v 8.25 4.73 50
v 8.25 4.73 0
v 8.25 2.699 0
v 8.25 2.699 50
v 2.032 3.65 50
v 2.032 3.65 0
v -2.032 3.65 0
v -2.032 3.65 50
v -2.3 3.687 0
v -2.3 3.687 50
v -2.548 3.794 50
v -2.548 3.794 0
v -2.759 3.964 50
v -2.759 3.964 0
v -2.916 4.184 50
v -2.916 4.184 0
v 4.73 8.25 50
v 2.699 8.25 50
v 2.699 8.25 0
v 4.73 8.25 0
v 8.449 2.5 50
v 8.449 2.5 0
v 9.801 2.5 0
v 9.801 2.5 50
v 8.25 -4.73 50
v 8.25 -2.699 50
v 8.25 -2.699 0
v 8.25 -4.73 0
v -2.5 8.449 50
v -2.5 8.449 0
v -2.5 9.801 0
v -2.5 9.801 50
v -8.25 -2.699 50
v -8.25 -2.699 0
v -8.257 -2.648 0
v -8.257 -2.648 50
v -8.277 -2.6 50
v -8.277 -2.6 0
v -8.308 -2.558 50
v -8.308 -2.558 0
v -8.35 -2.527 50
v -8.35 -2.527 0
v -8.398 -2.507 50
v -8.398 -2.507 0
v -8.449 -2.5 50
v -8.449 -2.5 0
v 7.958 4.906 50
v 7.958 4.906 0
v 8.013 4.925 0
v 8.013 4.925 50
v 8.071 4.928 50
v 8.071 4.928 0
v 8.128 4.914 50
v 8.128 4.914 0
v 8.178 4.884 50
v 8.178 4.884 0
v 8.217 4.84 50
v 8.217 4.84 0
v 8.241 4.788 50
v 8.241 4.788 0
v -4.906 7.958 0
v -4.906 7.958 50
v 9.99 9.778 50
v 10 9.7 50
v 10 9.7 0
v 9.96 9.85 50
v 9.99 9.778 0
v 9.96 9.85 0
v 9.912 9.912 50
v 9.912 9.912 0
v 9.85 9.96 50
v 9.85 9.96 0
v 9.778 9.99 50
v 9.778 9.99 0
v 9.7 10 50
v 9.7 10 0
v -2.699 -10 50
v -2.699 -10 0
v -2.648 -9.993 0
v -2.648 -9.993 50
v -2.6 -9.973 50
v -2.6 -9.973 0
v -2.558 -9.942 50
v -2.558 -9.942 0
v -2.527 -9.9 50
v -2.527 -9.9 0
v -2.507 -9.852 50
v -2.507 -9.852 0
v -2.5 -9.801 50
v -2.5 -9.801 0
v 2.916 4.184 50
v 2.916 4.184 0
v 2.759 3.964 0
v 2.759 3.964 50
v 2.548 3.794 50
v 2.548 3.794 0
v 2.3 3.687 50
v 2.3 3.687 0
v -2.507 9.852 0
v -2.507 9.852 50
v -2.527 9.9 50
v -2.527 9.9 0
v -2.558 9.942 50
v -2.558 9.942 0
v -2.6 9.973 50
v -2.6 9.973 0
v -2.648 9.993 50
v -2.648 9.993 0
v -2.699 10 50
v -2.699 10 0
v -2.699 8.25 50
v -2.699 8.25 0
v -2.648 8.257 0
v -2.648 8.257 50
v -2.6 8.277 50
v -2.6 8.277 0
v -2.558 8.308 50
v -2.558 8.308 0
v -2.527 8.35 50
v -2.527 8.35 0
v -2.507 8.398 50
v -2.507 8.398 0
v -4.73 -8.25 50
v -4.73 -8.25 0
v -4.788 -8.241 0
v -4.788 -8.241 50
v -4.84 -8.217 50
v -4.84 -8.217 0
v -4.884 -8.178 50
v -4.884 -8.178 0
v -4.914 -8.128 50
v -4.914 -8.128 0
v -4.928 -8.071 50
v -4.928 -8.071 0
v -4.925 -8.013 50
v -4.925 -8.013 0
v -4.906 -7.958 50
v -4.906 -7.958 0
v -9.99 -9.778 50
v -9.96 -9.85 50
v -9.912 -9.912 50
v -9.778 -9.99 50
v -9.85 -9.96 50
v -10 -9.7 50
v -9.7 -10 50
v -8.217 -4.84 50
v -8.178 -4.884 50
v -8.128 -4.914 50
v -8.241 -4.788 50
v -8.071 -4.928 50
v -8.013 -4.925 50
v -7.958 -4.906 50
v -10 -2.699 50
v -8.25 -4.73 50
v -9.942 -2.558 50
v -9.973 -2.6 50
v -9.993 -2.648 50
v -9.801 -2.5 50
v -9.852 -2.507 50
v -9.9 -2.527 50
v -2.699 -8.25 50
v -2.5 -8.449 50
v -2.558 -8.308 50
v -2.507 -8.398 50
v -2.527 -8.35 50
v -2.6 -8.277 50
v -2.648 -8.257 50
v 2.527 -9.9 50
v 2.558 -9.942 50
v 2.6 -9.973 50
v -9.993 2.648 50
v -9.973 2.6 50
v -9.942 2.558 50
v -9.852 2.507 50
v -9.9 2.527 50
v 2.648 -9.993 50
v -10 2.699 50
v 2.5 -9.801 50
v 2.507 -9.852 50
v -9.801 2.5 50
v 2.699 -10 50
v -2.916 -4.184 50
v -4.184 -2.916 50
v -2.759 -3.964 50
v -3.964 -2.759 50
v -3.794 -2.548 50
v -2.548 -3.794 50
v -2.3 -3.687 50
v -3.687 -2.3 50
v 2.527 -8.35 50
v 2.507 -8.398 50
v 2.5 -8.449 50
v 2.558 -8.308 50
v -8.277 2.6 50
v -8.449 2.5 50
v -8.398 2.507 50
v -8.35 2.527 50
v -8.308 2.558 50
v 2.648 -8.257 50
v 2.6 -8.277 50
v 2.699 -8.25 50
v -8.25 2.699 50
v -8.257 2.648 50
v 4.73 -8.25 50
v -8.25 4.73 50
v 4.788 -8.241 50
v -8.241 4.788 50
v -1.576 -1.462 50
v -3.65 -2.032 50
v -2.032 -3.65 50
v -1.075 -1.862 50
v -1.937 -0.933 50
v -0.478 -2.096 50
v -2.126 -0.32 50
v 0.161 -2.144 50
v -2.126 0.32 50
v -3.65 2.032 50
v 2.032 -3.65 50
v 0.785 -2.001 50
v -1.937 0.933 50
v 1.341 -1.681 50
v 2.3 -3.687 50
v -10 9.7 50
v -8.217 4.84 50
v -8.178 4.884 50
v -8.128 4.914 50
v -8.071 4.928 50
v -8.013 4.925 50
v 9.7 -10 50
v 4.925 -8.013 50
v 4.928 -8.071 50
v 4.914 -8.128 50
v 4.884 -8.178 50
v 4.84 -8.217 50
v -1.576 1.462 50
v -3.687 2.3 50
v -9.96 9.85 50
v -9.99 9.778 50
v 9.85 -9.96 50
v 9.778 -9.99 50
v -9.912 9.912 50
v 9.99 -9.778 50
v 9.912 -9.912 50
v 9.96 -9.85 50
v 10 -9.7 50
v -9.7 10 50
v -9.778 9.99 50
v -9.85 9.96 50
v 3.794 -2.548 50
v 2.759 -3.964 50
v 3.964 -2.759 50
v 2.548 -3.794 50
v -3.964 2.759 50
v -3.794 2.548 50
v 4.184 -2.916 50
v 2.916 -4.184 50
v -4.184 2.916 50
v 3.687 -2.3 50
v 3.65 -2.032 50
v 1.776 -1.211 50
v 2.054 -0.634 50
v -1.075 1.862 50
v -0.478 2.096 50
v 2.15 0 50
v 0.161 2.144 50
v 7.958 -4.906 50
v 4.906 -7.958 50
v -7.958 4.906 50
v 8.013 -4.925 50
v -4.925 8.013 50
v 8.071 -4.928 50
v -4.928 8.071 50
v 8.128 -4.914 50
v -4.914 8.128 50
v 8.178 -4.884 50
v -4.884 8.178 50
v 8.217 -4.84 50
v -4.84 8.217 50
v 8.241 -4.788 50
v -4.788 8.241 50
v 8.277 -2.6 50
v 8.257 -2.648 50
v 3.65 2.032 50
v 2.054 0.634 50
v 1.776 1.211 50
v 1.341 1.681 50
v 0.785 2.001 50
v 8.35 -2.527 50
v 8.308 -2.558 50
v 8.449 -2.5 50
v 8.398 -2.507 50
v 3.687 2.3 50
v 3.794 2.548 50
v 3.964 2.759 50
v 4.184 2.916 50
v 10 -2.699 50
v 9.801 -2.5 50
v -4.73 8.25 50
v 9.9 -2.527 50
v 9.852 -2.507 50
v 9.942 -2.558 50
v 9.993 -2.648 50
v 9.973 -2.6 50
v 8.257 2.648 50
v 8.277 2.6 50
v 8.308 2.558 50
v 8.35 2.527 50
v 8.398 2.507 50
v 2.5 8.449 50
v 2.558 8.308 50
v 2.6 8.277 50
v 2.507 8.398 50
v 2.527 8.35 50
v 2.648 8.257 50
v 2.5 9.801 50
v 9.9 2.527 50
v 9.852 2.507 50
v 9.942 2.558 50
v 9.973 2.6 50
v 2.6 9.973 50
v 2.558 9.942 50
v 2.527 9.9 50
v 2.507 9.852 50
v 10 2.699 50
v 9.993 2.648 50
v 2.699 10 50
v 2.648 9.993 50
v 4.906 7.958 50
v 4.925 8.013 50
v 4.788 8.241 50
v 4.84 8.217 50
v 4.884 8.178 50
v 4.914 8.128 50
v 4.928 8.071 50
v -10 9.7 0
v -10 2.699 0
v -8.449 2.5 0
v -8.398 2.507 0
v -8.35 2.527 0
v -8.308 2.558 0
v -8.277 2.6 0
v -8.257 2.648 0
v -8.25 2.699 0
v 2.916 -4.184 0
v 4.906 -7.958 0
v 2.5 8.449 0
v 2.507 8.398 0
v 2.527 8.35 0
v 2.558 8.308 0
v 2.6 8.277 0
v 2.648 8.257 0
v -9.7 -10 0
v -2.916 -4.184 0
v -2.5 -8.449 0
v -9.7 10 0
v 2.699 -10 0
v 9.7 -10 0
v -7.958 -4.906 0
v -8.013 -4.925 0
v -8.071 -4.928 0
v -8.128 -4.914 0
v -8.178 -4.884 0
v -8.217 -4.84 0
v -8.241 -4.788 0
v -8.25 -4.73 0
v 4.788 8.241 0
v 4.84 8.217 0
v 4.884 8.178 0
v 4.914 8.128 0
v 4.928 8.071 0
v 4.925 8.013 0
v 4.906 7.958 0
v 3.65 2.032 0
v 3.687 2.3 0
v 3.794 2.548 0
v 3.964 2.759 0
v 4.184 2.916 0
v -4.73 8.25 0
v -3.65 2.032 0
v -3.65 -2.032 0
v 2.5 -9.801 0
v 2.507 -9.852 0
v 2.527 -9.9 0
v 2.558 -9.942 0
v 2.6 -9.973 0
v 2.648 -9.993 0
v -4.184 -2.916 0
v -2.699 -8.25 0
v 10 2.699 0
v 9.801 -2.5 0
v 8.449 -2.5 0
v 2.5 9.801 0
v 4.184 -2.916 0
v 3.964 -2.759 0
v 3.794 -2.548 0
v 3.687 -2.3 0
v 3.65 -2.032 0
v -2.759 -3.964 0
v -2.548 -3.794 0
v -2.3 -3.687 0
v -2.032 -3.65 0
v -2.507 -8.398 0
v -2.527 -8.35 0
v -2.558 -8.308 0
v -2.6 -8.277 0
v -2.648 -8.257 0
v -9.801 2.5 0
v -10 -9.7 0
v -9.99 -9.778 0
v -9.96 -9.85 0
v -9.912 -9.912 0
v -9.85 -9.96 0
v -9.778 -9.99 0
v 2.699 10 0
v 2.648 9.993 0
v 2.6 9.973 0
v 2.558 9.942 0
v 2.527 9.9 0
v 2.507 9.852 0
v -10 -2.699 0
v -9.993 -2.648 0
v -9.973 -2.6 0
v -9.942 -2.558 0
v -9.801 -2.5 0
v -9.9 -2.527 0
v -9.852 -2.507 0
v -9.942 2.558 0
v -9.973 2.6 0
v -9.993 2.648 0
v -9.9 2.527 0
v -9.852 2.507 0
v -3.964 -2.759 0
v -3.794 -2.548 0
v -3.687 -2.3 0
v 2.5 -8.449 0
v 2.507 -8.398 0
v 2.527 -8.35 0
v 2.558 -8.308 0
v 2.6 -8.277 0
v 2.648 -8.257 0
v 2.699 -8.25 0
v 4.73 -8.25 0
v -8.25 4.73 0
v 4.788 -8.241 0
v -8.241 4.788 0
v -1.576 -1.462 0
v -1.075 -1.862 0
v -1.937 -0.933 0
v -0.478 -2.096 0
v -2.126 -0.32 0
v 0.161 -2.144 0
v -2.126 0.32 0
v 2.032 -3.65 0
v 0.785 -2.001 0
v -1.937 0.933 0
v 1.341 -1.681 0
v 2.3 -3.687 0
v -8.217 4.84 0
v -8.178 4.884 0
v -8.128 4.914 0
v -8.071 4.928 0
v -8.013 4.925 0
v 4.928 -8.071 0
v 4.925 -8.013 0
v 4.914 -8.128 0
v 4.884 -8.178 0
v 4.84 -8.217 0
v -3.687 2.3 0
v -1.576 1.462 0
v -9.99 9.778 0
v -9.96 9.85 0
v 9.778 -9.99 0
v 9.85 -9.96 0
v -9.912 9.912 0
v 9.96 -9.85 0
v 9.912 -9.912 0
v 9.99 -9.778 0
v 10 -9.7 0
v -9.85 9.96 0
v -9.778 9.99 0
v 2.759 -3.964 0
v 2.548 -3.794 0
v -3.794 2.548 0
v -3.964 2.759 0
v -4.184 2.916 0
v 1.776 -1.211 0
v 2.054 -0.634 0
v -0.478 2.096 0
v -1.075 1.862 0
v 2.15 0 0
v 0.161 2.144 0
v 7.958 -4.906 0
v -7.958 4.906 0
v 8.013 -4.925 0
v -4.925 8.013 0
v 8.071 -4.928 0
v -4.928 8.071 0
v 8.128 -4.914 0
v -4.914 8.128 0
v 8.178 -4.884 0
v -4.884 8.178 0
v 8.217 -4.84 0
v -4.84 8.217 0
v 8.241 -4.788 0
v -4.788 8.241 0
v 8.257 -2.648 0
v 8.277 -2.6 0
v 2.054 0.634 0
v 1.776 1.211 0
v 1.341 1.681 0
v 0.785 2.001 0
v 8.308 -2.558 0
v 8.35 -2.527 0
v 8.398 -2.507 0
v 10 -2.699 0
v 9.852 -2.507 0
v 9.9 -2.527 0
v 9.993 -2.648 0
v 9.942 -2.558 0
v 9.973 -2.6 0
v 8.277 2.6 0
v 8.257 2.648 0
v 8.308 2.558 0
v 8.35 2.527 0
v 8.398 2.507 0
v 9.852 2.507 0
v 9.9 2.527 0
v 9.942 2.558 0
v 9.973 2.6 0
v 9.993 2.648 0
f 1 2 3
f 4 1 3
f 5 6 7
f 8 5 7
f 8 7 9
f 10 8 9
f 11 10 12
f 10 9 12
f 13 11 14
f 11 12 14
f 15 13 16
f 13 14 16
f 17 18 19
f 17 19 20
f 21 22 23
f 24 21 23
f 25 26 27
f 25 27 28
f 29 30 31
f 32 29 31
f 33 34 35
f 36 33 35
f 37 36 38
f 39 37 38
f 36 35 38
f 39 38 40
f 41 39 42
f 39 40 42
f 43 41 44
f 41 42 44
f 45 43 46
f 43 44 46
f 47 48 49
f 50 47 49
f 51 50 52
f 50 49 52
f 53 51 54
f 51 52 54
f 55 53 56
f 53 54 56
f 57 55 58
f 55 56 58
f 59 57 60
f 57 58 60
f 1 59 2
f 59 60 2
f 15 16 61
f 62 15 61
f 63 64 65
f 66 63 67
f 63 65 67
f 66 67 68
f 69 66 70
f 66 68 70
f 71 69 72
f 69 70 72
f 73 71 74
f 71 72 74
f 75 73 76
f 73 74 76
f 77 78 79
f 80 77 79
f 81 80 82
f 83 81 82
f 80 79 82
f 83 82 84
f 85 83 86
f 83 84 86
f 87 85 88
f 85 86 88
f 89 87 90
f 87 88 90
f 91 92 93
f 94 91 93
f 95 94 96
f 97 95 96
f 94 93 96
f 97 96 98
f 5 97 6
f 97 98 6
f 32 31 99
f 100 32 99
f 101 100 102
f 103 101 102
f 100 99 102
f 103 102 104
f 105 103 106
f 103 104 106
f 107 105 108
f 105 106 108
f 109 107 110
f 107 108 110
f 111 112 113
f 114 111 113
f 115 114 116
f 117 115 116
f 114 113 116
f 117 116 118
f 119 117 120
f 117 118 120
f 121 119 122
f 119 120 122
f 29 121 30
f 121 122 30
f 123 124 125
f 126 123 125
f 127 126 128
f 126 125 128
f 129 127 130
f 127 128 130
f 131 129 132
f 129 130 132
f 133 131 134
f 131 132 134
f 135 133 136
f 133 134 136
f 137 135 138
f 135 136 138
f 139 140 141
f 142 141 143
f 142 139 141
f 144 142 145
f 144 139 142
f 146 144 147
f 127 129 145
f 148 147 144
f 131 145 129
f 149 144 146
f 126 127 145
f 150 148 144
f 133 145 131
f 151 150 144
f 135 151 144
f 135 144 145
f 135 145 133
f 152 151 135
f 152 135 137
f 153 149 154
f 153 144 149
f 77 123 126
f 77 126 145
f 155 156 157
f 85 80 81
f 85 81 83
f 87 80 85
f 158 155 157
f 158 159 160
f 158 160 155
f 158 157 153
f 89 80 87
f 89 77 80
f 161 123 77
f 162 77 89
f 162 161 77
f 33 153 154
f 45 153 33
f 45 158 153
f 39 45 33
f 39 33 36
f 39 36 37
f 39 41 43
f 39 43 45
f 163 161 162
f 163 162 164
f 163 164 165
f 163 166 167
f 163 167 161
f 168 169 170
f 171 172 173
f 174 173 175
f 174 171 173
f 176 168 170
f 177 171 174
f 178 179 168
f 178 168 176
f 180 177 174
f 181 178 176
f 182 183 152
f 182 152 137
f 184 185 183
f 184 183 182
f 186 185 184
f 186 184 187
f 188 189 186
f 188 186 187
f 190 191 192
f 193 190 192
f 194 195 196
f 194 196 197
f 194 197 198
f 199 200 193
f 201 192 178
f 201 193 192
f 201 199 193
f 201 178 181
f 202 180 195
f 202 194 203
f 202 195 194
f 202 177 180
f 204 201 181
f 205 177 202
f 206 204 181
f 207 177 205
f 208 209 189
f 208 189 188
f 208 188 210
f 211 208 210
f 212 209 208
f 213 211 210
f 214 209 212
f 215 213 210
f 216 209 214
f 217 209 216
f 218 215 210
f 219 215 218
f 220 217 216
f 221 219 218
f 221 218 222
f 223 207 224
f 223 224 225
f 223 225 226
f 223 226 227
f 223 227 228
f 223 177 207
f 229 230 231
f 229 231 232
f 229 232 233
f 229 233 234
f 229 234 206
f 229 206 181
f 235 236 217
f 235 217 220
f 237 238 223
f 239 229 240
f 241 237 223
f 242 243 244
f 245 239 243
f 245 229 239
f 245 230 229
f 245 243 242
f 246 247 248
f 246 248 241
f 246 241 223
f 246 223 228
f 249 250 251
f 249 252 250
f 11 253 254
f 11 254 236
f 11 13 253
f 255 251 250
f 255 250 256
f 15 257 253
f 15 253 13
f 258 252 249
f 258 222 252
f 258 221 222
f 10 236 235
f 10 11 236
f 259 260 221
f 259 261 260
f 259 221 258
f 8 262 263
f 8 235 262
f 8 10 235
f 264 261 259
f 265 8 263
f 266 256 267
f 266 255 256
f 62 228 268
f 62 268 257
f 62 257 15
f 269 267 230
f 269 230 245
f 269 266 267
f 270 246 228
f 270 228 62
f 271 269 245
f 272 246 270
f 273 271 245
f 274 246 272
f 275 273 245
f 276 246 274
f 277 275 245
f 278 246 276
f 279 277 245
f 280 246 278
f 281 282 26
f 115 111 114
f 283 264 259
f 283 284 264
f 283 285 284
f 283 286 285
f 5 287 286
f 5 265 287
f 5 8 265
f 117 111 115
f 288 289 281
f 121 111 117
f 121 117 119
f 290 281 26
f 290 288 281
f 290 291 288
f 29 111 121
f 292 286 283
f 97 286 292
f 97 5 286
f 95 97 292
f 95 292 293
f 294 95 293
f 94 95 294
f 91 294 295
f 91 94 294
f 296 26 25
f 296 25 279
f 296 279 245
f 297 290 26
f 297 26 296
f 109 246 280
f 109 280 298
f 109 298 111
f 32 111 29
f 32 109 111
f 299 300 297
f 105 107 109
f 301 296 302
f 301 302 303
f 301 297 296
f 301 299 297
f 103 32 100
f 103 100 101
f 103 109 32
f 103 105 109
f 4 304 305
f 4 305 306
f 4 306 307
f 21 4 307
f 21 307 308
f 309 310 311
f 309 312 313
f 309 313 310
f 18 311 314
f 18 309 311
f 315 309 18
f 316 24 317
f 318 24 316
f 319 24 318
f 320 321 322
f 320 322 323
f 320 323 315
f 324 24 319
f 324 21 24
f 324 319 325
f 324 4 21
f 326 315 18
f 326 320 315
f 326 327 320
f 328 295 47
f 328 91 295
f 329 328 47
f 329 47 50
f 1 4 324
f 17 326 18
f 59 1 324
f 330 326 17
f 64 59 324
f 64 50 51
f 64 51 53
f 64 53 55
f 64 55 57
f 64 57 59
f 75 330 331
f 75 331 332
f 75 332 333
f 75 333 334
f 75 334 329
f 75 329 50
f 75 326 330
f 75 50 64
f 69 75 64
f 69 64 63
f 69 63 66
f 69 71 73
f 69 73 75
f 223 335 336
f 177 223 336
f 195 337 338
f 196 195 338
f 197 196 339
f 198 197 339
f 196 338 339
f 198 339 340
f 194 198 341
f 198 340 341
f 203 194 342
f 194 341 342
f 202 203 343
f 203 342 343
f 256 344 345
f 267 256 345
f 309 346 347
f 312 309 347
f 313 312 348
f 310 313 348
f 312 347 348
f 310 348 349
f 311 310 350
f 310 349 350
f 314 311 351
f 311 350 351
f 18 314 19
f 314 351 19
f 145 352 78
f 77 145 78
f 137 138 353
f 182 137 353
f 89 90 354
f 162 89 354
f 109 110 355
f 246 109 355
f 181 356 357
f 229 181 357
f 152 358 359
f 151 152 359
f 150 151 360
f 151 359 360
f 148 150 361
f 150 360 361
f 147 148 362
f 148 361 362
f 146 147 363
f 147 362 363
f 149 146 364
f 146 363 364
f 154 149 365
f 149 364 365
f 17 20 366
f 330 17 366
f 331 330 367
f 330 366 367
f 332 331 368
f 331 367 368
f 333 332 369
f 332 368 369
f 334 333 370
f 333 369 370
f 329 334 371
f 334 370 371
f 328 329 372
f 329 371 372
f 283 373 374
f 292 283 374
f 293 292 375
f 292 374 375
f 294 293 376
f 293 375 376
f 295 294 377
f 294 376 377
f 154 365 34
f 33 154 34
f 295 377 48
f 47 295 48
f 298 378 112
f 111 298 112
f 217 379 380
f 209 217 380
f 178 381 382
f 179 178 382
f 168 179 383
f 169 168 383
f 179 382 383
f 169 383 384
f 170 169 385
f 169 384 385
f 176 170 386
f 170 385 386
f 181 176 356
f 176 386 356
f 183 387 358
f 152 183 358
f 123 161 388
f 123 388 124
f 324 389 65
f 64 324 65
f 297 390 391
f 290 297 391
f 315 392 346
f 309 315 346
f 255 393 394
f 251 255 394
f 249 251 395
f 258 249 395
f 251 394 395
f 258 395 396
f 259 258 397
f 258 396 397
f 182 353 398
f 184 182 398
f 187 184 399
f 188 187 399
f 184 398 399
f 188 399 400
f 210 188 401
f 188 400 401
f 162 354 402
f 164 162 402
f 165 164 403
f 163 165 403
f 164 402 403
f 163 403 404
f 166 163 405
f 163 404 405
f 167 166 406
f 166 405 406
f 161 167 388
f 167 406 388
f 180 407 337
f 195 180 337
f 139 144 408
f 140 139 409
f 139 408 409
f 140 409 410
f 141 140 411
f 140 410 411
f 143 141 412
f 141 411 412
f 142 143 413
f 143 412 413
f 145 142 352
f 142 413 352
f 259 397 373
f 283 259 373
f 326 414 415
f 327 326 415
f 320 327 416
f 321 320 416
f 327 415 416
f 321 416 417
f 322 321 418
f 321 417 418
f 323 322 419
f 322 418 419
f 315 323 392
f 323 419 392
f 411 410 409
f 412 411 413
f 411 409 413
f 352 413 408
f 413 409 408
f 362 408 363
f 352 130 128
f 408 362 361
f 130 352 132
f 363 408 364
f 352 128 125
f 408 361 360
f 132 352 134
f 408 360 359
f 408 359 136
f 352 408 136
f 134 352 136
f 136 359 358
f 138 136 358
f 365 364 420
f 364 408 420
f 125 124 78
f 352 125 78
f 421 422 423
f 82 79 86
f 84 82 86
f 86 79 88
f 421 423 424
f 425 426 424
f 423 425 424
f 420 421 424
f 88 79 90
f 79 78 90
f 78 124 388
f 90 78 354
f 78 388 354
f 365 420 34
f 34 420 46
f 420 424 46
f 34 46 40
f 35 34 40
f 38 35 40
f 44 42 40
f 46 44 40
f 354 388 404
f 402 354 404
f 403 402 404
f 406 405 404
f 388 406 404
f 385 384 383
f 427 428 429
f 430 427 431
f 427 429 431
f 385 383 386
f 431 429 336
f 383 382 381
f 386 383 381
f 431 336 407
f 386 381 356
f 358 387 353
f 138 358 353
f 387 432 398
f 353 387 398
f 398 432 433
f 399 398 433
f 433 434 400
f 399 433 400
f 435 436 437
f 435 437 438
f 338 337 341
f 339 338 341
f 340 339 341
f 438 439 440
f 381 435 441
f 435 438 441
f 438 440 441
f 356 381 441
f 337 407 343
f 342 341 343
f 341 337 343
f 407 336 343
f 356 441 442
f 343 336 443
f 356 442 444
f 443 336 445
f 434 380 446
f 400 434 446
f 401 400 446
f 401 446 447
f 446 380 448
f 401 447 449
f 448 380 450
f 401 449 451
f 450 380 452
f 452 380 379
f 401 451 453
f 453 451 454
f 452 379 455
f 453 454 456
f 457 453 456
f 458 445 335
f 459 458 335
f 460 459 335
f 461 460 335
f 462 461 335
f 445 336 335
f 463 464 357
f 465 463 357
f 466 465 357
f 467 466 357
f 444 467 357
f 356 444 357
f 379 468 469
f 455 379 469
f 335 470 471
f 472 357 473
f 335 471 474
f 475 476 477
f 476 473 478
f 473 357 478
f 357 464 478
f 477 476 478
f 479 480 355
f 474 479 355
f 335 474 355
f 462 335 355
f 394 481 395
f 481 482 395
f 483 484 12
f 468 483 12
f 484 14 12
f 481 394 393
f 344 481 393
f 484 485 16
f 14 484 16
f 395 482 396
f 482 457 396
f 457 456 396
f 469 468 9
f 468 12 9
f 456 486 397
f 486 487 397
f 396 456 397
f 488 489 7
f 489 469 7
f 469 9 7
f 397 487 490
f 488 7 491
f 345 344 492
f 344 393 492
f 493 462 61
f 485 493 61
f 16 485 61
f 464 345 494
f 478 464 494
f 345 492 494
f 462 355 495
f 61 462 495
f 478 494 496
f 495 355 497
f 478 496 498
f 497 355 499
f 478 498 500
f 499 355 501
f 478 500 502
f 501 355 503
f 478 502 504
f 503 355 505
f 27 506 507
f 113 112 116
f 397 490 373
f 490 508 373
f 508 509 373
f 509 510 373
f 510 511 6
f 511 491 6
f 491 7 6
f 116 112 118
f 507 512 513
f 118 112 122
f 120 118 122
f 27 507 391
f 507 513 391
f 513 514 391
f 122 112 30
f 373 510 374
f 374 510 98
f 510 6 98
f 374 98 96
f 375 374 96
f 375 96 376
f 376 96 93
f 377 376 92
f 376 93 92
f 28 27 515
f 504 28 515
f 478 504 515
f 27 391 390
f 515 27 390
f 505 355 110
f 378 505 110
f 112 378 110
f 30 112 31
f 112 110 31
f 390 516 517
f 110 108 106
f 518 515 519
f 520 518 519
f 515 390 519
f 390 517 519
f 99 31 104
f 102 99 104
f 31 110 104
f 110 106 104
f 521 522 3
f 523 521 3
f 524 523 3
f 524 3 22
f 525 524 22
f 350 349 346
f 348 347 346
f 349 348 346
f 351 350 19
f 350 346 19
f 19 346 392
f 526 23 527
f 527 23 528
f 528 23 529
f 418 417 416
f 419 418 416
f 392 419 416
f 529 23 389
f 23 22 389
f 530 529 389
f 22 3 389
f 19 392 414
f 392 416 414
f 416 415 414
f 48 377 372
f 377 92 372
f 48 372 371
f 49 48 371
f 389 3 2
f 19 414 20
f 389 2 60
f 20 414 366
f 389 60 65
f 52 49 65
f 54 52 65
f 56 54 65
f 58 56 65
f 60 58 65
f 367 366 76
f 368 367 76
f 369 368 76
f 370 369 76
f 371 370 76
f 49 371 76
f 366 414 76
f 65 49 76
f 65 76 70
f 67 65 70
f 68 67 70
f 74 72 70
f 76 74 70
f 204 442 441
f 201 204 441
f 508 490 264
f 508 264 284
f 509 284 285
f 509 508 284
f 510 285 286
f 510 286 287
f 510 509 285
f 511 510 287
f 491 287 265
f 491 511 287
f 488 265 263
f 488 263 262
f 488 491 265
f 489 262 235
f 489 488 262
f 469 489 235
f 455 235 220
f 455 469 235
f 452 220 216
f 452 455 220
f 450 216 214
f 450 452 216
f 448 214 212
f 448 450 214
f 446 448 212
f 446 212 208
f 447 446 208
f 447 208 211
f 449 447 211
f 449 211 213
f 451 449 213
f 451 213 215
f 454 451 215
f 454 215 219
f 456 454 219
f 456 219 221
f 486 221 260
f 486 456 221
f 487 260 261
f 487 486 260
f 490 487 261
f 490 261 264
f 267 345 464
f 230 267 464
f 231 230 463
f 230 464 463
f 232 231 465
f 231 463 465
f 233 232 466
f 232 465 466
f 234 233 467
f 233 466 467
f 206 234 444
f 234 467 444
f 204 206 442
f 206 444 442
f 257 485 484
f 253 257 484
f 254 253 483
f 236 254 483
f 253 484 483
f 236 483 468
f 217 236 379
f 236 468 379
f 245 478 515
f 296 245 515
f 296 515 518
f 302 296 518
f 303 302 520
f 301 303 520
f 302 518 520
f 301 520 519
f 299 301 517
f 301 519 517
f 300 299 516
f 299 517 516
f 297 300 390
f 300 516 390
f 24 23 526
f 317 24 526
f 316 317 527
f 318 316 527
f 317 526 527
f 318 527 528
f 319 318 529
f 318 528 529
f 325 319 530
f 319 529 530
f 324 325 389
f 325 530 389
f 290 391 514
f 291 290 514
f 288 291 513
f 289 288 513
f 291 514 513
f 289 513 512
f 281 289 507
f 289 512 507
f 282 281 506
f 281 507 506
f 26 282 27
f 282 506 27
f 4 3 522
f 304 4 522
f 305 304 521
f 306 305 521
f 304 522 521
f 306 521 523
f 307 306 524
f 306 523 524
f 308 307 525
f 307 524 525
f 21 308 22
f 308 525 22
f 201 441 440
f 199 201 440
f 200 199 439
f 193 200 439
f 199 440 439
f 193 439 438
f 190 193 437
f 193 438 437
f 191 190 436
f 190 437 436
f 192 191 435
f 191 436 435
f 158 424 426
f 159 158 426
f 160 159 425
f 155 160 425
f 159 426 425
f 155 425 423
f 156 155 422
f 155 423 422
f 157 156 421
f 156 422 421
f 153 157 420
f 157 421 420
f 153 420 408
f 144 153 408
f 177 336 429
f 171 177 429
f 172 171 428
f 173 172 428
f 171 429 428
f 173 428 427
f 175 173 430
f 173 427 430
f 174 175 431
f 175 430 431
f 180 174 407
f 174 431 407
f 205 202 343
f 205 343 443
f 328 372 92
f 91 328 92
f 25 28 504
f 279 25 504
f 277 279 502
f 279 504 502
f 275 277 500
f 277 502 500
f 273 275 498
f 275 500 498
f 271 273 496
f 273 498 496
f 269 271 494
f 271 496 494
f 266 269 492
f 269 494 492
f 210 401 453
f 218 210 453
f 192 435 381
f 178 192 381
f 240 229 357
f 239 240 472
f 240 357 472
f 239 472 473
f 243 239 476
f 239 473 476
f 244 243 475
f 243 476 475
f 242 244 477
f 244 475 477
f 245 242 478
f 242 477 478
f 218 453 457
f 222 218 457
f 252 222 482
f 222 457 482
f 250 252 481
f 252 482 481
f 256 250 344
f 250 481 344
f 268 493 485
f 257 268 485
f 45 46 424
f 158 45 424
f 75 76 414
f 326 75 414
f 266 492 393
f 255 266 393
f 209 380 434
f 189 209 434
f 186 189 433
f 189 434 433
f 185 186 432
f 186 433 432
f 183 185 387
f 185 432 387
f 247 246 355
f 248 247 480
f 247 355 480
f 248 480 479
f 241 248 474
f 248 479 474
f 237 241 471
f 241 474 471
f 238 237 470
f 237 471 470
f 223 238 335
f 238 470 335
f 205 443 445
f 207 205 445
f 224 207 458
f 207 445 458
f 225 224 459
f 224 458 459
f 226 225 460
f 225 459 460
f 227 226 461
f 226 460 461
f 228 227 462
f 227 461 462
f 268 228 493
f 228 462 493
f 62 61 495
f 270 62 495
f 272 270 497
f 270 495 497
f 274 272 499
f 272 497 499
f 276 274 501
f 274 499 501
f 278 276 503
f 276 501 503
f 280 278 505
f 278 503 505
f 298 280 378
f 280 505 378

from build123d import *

# Parameters (mm, degrees)
F0_R     = 2.15
F1_DEPTH = 50


with BuildPart() as f1:
    # F0 (on Top) → F1 (new body)
    with BuildSketch(Plane.XY):
        with BuildLine():
            Line((-2.699069, 10), (-9.7, 10))
            ThreePointArc((-9.7, 10), (-9.912132, 9.912132), (-10, 9.7))
            Line((-10, 9.7), (-10, 2.699069))
            ThreePointArc((-10, 2.699069), (-9.941694, 2.558306), (-9.800931, 2.5))
            Line((-9.800931, 2.5), (-8.449069, 2.5))
            ThreePointArc((-8.449069, 2.5), (-8.308306, 2.558306), (-8.25, 2.699069))
            Line((-8.25, 2.699069), (-8.25, 4.730027))
            ThreePointArc((-8.25, 4.730027), (-8.153763, 4.90048), (-7.958101, 4.906127))
            Line((-7.958101, 4.906127), (-4.183679, 2.916455))
            ThreePointArc((-4.183679, 2.916455), (-3.793752, 2.548405), (-3.65, 2.03184))
            Line((-3.65, 2.03184), (-3.65, 0))
            Line((-3.65, 0), (-3.65, -2.03184))
            ThreePointArc((-3.65, -2.03184), (-3.793752, -2.548405), (-4.183679, -2.916455))
            Line((-4.183679, -2.916455), (-7.958101, -4.906127))
            ThreePointArc((-7.958101, -4.906127), (-8.153763, -4.90048), (-8.25, -4.730027))
            Line((-8.25, -4.730027), (-8.25, -2.699069))
            ThreePointArc((-8.25, -2.699069), (-8.308306, -2.558306), (-8.449069, -2.5))
            Line((-8.449069, -2.5), (-9.800931, -2.5))
            ThreePointArc((-9.800931, -2.5), (-9.941694, -2.558306), (-10, -2.699069))
            Line((-10, -2.699069), (-10, -9.7))
            ThreePointArc((-10, -9.7), (-9.912132, -9.912132), (-9.7, -10))
            Line((-9.7, -10), (-2.699069, -10))
            ThreePointArc((-2.699069, -10), (-2.558306, -9.941694), (-2.5, -9.800931))
            Line((-2.5, -9.800931), (-2.5, -8.449069))
            ThreePointArc((-2.5, -8.449069), (-2.558306, -8.308306), (-2.699069, -8.25))
            Line((-2.699069, -8.25), (-4.730027, -8.25))
            ThreePointArc((-4.730027, -8.25), (-4.90048, -8.153763), (-4.906127, -7.958101))
            Line((-4.906127, -7.958101), (-2.916455, -4.183679))
            ThreePointArc((-2.916455, -4.183679), (-2.548405, -3.793752), (-2.03184, -3.65))
            Line((-2.03184, -3.65), (0, -3.65))
            Line((0, -3.65), (2.03184, -3.65))
            ThreePointArc((2.03184, -3.65), (2.548405, -3.793752), (2.916455, -4.183679))
            Line((2.916455, -4.183679), (4.906127, -7.958101))
            ThreePointArc((4.906127, -7.958101), (4.90048, -8.153763), (4.730027, -8.25))
            Line((4.730027, -8.25), (2.699069, -8.25))
            ThreePointArc((2.699069, -8.25), (2.558306, -8.308306), (2.5, -8.449069))
            Line((2.5, -8.449069), (2.5, -9.800931))
            ThreePointArc((2.5, -9.800931), (2.558306, -9.941694), (2.699069, -10))
            Line((2.699069, -10), (9.7, -10))
            ThreePointArc((9.7, -10), (9.912132, -9.912132), (10, -9.7))
            Line((10, -9.7), (10, -2.699069))
            ThreePointArc((10, -2.699069), (9.941694, -2.558306), (9.800931, -2.5))
            Line((9.800931, -2.5), (8.449069, -2.5))
            ThreePointArc((8.449069, -2.5), (8.308306, -2.558306), (8.25, -2.699069))
            Line((8.25, -2.699069), (8.25, -4.730027))
            ThreePointArc((8.25, -4.730027), (8.153763, -4.90048), (7.958101, -4.906127))
            Line((7.958101, -4.906127), (4.183679, -2.916455))
            ThreePointArc((4.183679, -2.916455), (3.793752, -2.548405), (3.65, -2.03184))
            Line((3.65, -2.03184), (3.65, 0))
            Line((3.65, 0), (3.65, 2.03184))
            ThreePointArc((3.65, 2.03184), (3.793752, 2.548405), (4.183679, 2.916455))
            Line((4.183679, 2.916455), (7.958101, 4.906127))
            ThreePointArc((7.958101, 4.906127), (8.153763, 4.90048), (8.25, 4.730027))
            Line((8.25, 4.730027), (8.25, 2.699069))
            ThreePointArc((8.25, 2.699069), (8.308306, 2.558306), (8.449069, 2.5))
            Line((8.449069, 2.5), (9.800931, 2.5))
            ThreePointArc((9.800931, 2.5), (9.941694, 2.558306), (10, 2.699069))
            Line((10, 2.699069), (10, 9.7))
            ThreePointArc((10, 9.7), (9.912132, 9.912132), (9.7, 10))
            Line((9.7, 10), (2.699069, 10))
            ThreePointArc((2.699069, 10), (2.558306, 9.941694), (2.5, 9.800931))
            Line((2.5, 9.800931), (2.5, 8.449069))
            ThreePointArc((2.5, 8.449069), (2.558306, 8.308306), (2.699069, 8.25))
            Line((2.699069, 8.25), (4.730027, 8.25))
            ThreePointArc((4.730027, 8.25), (4.90048, 8.153763), (4.906127, 7.958101))
            Line((4.906127, 7.958101), (2.916455, 4.183679))
            ThreePointArc((2.916455, 4.183679), (2.548405, 3.793752), (2.03184, 3.65))
            Line((2.03184, 3.65), (0, 3.65))
            Line((0, 3.65), (-2.03184, 3.65))
            ThreePointArc((-2.03184, 3.65), (-2.548405, 3.793752), (-2.916455, 4.183679))
            Line((-2.916455, 4.183679), (-4.906127, 7.958101))
            ThreePointArc((-4.906127, 7.958101), (-4.90048, 8.153763), (-4.730027, 8.25))
            Line((-4.730027, 8.25), (-2.699069, 8.25))
            ThreePointArc((-2.699069, 8.25), (-2.558306, 8.308306), (-2.5, 8.449069))
            Line((-2.5, 8.449069), (-2.5, 9.800931))
            ThreePointArc((-2.5, 9.800931), (-2.558306, 9.941694), (-2.699069, 10))
        make_face()
        Circle(F0_R, mode=Mode.SUBTRACT)
    extrude(amount=F1_DEPTH)


solid = f1.part
